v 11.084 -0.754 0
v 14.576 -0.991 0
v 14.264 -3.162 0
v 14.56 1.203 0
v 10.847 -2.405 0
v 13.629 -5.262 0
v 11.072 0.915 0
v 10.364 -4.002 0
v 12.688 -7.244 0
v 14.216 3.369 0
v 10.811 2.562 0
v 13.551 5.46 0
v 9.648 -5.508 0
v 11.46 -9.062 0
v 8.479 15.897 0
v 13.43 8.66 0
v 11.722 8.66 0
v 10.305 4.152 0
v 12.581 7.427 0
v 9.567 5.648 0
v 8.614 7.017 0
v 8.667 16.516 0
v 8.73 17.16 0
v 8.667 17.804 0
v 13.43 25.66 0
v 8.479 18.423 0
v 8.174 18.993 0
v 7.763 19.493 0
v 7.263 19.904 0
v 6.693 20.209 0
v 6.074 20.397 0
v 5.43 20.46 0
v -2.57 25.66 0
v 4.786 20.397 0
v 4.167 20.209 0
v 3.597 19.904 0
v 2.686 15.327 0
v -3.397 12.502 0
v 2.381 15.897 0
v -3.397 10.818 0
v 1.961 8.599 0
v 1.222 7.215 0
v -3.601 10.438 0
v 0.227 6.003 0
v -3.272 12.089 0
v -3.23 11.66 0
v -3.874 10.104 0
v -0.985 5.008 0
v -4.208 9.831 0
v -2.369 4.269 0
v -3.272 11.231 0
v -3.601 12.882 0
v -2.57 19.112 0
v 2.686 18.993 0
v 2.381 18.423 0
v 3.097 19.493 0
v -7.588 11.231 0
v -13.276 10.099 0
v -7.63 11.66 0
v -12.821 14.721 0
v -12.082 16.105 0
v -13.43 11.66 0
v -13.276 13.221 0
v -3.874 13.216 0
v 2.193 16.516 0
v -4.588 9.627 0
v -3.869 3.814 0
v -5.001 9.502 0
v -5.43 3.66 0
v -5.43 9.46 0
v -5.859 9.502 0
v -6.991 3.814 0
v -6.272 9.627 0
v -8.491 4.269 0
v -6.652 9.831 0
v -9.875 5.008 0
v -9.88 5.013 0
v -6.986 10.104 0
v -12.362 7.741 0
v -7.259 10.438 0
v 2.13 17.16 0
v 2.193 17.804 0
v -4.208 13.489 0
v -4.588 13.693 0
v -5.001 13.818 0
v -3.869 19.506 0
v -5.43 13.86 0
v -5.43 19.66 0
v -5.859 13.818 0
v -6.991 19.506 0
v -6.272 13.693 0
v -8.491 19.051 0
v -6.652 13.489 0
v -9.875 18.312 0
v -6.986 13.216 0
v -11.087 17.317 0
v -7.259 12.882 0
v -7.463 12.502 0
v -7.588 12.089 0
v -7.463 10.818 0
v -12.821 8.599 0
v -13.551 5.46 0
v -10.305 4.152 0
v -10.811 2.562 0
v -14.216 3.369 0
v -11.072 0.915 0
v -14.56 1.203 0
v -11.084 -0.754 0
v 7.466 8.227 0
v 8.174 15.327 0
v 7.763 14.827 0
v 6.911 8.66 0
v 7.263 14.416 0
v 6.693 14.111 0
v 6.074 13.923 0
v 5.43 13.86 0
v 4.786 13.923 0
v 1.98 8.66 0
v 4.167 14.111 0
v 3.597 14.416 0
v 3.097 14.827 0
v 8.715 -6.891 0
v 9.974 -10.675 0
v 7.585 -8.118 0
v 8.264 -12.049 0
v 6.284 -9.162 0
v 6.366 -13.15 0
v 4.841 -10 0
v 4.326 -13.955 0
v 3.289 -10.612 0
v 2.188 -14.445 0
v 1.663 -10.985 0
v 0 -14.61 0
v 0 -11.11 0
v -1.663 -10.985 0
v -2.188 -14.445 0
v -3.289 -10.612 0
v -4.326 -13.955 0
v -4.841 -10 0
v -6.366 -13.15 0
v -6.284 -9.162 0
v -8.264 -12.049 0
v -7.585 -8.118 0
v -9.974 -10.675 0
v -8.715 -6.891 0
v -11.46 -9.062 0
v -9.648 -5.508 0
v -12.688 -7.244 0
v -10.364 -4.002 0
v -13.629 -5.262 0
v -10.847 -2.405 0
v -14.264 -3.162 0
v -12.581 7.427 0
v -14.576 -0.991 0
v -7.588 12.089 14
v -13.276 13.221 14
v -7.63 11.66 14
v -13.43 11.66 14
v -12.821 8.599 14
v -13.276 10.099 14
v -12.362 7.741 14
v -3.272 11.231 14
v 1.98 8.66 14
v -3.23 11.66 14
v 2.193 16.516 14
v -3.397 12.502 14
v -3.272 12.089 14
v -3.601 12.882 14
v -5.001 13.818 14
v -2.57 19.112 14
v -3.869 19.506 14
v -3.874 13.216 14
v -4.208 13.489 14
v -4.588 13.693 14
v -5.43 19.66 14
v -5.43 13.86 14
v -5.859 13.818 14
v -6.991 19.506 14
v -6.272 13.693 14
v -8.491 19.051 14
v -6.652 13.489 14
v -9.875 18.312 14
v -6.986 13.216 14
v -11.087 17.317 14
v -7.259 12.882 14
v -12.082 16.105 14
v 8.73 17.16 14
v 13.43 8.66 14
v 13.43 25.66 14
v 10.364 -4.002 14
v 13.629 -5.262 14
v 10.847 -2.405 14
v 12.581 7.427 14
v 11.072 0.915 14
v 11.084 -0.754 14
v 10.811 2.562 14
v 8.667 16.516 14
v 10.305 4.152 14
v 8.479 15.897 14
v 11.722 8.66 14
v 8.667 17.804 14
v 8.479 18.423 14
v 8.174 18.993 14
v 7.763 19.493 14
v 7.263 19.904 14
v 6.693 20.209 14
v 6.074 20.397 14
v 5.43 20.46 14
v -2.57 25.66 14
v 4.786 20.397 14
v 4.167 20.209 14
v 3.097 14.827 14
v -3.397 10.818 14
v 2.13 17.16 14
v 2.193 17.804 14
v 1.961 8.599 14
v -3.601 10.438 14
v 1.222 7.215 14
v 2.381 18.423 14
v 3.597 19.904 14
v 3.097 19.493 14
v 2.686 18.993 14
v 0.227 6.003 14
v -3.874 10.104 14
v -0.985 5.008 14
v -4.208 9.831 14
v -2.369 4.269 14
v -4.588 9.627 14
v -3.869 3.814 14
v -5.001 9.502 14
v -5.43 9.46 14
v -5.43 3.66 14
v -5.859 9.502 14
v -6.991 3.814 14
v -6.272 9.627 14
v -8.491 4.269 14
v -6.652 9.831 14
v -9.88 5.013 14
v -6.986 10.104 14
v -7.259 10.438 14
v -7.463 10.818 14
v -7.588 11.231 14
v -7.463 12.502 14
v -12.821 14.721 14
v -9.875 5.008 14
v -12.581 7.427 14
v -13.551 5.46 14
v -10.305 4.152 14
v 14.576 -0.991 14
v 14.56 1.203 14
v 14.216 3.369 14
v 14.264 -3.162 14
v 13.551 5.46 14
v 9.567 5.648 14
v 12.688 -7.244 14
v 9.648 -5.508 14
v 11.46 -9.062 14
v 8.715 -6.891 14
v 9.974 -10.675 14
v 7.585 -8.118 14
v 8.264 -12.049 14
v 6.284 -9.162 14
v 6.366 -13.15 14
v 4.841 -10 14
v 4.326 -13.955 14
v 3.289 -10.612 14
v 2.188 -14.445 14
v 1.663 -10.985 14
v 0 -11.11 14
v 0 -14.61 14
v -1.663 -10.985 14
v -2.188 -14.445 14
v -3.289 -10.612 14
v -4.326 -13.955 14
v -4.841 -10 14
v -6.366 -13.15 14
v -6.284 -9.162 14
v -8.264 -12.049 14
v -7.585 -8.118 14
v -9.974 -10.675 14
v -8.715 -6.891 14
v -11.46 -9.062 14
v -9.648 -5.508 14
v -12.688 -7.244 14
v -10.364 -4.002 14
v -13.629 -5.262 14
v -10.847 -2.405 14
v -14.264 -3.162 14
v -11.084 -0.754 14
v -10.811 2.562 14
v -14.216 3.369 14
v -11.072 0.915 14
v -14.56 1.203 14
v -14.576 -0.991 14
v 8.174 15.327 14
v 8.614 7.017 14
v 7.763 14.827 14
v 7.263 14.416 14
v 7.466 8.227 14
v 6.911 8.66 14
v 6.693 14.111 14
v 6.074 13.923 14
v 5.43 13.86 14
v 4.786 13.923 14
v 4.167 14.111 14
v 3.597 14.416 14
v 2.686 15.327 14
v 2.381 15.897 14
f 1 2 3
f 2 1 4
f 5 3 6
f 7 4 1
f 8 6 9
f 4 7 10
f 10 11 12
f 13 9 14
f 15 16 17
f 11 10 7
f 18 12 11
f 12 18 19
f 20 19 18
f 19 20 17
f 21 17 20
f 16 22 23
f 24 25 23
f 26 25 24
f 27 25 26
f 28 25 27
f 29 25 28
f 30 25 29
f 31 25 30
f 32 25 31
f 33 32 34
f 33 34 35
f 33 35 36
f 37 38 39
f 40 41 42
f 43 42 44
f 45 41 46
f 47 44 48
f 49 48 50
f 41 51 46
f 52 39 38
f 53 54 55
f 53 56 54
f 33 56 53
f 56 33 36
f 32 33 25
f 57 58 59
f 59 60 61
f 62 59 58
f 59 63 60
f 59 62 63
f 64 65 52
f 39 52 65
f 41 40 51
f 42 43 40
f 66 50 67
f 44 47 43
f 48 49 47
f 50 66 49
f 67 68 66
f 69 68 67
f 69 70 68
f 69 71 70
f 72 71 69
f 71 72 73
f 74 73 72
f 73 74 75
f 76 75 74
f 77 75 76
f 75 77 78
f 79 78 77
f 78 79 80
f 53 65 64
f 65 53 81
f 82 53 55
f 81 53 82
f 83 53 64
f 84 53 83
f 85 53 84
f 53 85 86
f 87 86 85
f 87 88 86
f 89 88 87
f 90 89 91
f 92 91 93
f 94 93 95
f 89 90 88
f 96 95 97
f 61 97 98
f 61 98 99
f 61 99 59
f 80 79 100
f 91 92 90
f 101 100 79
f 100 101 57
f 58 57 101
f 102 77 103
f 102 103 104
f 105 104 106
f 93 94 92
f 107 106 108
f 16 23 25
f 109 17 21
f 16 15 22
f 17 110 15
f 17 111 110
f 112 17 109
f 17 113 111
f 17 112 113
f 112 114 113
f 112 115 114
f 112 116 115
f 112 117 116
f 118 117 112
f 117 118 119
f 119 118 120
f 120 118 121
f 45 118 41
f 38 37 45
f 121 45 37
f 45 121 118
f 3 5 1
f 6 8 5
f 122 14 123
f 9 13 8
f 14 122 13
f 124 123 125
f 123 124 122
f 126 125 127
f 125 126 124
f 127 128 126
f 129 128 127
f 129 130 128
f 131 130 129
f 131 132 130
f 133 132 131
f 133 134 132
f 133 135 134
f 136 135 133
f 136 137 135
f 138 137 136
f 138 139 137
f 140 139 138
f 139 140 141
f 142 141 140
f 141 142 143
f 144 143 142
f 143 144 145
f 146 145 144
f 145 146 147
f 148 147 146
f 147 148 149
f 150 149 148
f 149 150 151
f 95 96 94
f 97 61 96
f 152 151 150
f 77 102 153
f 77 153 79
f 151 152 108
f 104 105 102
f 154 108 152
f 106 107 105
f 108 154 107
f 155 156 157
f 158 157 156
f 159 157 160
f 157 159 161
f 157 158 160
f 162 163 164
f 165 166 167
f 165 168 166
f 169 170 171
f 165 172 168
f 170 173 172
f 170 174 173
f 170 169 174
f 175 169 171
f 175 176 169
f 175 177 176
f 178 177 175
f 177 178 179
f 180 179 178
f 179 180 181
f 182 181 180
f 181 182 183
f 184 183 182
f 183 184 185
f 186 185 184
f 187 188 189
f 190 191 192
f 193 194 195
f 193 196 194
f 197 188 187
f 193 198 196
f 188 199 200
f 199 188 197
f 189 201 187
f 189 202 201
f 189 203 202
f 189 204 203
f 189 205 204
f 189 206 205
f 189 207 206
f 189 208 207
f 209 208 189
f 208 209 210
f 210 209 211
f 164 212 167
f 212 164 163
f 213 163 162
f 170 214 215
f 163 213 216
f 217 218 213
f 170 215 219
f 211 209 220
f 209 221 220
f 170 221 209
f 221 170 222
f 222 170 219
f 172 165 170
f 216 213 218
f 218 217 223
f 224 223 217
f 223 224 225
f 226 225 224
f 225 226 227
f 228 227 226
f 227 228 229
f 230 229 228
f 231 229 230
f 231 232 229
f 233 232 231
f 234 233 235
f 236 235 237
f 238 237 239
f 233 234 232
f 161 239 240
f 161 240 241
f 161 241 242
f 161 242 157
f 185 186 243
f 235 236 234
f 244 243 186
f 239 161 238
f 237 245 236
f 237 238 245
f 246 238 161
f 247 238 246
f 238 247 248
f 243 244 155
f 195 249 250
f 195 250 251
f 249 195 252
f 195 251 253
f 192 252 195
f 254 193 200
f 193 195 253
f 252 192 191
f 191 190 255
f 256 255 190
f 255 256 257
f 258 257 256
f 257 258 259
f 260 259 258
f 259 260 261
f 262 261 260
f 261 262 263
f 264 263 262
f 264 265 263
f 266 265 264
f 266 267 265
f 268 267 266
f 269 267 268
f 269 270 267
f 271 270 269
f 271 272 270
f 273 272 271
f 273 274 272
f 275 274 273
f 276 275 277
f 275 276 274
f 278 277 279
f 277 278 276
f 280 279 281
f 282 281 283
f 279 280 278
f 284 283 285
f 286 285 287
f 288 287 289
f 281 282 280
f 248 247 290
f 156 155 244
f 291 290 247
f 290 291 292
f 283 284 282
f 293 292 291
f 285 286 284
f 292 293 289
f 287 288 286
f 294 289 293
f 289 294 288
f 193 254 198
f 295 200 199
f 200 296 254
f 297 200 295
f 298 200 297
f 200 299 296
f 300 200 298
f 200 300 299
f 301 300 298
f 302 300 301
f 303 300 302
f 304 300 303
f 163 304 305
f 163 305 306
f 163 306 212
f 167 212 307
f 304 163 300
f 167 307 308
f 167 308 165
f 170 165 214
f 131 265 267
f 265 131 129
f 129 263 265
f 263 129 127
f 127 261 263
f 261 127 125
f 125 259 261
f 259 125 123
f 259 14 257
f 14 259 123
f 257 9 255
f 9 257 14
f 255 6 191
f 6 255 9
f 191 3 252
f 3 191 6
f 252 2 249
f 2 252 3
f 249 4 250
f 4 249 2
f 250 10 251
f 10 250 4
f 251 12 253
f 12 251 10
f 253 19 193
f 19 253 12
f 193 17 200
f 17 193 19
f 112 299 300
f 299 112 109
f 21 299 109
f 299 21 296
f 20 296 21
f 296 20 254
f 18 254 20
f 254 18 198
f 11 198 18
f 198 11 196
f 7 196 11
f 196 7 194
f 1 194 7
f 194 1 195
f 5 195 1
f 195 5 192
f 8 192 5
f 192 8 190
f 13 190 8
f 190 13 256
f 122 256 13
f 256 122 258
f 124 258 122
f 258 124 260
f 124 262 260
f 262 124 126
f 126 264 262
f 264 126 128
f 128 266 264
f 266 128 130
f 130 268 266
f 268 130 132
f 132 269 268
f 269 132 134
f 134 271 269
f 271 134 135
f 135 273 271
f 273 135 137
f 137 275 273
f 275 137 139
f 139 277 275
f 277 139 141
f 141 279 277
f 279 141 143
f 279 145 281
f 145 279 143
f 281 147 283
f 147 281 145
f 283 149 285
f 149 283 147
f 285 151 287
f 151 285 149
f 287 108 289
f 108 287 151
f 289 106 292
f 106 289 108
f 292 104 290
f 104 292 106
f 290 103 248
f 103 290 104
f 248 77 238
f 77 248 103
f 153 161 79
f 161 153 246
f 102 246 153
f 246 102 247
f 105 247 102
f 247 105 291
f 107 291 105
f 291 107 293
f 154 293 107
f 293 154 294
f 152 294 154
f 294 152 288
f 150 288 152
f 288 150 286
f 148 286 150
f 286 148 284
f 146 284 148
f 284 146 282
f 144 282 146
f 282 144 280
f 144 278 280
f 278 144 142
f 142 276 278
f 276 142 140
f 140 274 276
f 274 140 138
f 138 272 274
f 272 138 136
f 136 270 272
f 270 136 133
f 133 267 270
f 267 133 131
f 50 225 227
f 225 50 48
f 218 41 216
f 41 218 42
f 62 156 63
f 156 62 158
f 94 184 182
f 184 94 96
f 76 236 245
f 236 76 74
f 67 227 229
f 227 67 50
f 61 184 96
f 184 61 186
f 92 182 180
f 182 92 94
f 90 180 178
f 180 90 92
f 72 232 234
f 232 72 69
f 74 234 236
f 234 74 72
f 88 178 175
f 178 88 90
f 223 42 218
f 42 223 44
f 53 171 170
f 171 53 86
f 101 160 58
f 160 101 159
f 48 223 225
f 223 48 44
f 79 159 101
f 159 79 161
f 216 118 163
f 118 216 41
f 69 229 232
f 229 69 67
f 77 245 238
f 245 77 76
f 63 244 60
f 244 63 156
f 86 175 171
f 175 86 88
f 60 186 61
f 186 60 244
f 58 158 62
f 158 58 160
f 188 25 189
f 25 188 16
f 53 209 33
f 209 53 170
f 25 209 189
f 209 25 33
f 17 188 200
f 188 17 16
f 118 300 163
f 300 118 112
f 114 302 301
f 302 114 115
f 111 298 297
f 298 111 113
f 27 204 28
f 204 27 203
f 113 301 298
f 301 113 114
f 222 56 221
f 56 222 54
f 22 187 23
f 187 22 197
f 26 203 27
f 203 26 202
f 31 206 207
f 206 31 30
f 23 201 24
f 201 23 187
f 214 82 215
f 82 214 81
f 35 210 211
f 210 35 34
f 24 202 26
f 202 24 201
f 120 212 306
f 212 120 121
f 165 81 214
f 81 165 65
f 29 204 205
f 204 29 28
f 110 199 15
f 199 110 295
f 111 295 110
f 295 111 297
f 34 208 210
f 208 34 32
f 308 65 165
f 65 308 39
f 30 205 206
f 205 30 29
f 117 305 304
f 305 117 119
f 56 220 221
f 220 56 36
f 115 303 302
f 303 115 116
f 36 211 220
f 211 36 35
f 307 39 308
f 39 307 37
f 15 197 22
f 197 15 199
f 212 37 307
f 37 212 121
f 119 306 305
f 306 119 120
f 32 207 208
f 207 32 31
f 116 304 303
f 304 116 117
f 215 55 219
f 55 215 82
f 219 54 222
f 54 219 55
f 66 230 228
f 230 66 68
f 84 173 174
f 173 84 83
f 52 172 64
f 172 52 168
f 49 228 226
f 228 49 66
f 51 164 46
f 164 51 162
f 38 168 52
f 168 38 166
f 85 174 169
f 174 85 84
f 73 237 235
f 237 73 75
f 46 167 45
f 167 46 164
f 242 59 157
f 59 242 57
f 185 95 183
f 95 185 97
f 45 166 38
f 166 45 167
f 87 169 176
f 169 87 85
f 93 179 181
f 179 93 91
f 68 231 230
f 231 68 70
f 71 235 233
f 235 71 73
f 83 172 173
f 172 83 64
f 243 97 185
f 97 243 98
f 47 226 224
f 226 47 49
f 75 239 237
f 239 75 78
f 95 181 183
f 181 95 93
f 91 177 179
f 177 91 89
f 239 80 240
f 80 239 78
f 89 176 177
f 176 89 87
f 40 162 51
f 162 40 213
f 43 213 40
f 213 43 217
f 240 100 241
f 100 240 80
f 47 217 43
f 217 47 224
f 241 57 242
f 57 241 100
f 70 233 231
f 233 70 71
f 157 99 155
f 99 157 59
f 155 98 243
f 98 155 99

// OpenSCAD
$fn = 32;

// ----------------------------------------------------------------------
// Pipe clamp: 29.22 mm ring, 3.5 mm wall, 14 mm wide
// ----------------------------------------------------------------------

// --- parameters (mm) ---
outer_r = 14.61;          // clamp outside radius
inner_r = 11.11;          // pipe bore radius
band = 3.5;               // band thickness
clamp_w = 14;             // clamp width
opening = 50;             // opening angle between the ends
lug_w = 16;               // lug width
lug_len = 17;             // lug length
bolt_d = 6.6;             // bolt hole
knuckle_d = 16;           // hinge knuckle diameter
pin_d = 4.4;              // hinge pin hole

clamp_profile = [[-6.174, 13.241], [-8.087, 12.167], [-9.818, 10.819], [-11.327, 9.227], [-12.581, 7.427], [-13.551, 5.46], [-14.216, 3.369], [-14.56, 1.203], [-14.576, -0.991], [-14.264, -3.162], [-13.629, -5.262], [-12.688, -7.244], [-11.46, -9.062], [-9.974, -10.675], [-8.264, -12.049], [-6.366, -13.15], [-4.326, -13.955], [-2.188, -14.445], [0, -14.61], [2.188, -14.445], [4.326, -13.955], [6.366, -13.15], [8.264, -12.049], [9.974, -10.675], [11.46, -9.062], [12.688, -7.244], [13.629, -5.262], [14.264, -3.162], [14.576, -0.991], [14.56, 1.203], [14.216, 3.369], [13.551, 5.46], [12.581, 7.427], [11.327, 9.227], [9.818, 10.819], [8.087, 12.167], [6.174, 13.241], [4.695, 10.069], [6.15, 9.253], [7.466, 8.227], [8.614, 7.017], [9.567, 5.648], [10.305, 4.152], [10.811, 2.562], [11.072, 0.915], [11.084, -0.754], [10.847, -2.405], [10.364, -4.002], [9.648, -5.508], [8.715, -6.891], [7.585, -8.118], [6.284, -9.162], [4.841, -10], [3.289, -10.612], [1.663, -10.985], [0, -11.11], [-1.663, -10.985], [-3.289, -10.612], [-4.841, -10], [-6.284, -9.162], [-7.585, -8.118], [-8.715, -6.891], [-9.648, -5.508], [-10.364, -4.002], [-10.847, -2.405], [-11.084, -0.754], [-11.072, 0.915], [-10.811, 2.562], [-10.305, 4.152], [-9.567, 5.648], [-8.614, 7.017], [-7.466, 8.227], [-6.15, 9.253], [-4.695, 10.069]];

difference() {
  union() {
    linear_extrude(height = clamp_w) polygon(clamp_profile);
    /* hinge knuckle, sunk 2 mm into the band end */
    translate([-5.43, 11.66, 0]) cylinder(h = clamp_w, d = knuckle_d);
    /* bolt lug on the other end */
    translate([-2.57, 8.66, 0]) cube([lug_w, 17, clamp_w]);
  }
  translate([5.43, 17.16, -2.5]) cylinder(h = clamp_w + 5, d = bolt_d);
  translate([-5.43, 11.66, -2.5]) cylinder(h = clamp_w + 5, d = pin_d);
}
